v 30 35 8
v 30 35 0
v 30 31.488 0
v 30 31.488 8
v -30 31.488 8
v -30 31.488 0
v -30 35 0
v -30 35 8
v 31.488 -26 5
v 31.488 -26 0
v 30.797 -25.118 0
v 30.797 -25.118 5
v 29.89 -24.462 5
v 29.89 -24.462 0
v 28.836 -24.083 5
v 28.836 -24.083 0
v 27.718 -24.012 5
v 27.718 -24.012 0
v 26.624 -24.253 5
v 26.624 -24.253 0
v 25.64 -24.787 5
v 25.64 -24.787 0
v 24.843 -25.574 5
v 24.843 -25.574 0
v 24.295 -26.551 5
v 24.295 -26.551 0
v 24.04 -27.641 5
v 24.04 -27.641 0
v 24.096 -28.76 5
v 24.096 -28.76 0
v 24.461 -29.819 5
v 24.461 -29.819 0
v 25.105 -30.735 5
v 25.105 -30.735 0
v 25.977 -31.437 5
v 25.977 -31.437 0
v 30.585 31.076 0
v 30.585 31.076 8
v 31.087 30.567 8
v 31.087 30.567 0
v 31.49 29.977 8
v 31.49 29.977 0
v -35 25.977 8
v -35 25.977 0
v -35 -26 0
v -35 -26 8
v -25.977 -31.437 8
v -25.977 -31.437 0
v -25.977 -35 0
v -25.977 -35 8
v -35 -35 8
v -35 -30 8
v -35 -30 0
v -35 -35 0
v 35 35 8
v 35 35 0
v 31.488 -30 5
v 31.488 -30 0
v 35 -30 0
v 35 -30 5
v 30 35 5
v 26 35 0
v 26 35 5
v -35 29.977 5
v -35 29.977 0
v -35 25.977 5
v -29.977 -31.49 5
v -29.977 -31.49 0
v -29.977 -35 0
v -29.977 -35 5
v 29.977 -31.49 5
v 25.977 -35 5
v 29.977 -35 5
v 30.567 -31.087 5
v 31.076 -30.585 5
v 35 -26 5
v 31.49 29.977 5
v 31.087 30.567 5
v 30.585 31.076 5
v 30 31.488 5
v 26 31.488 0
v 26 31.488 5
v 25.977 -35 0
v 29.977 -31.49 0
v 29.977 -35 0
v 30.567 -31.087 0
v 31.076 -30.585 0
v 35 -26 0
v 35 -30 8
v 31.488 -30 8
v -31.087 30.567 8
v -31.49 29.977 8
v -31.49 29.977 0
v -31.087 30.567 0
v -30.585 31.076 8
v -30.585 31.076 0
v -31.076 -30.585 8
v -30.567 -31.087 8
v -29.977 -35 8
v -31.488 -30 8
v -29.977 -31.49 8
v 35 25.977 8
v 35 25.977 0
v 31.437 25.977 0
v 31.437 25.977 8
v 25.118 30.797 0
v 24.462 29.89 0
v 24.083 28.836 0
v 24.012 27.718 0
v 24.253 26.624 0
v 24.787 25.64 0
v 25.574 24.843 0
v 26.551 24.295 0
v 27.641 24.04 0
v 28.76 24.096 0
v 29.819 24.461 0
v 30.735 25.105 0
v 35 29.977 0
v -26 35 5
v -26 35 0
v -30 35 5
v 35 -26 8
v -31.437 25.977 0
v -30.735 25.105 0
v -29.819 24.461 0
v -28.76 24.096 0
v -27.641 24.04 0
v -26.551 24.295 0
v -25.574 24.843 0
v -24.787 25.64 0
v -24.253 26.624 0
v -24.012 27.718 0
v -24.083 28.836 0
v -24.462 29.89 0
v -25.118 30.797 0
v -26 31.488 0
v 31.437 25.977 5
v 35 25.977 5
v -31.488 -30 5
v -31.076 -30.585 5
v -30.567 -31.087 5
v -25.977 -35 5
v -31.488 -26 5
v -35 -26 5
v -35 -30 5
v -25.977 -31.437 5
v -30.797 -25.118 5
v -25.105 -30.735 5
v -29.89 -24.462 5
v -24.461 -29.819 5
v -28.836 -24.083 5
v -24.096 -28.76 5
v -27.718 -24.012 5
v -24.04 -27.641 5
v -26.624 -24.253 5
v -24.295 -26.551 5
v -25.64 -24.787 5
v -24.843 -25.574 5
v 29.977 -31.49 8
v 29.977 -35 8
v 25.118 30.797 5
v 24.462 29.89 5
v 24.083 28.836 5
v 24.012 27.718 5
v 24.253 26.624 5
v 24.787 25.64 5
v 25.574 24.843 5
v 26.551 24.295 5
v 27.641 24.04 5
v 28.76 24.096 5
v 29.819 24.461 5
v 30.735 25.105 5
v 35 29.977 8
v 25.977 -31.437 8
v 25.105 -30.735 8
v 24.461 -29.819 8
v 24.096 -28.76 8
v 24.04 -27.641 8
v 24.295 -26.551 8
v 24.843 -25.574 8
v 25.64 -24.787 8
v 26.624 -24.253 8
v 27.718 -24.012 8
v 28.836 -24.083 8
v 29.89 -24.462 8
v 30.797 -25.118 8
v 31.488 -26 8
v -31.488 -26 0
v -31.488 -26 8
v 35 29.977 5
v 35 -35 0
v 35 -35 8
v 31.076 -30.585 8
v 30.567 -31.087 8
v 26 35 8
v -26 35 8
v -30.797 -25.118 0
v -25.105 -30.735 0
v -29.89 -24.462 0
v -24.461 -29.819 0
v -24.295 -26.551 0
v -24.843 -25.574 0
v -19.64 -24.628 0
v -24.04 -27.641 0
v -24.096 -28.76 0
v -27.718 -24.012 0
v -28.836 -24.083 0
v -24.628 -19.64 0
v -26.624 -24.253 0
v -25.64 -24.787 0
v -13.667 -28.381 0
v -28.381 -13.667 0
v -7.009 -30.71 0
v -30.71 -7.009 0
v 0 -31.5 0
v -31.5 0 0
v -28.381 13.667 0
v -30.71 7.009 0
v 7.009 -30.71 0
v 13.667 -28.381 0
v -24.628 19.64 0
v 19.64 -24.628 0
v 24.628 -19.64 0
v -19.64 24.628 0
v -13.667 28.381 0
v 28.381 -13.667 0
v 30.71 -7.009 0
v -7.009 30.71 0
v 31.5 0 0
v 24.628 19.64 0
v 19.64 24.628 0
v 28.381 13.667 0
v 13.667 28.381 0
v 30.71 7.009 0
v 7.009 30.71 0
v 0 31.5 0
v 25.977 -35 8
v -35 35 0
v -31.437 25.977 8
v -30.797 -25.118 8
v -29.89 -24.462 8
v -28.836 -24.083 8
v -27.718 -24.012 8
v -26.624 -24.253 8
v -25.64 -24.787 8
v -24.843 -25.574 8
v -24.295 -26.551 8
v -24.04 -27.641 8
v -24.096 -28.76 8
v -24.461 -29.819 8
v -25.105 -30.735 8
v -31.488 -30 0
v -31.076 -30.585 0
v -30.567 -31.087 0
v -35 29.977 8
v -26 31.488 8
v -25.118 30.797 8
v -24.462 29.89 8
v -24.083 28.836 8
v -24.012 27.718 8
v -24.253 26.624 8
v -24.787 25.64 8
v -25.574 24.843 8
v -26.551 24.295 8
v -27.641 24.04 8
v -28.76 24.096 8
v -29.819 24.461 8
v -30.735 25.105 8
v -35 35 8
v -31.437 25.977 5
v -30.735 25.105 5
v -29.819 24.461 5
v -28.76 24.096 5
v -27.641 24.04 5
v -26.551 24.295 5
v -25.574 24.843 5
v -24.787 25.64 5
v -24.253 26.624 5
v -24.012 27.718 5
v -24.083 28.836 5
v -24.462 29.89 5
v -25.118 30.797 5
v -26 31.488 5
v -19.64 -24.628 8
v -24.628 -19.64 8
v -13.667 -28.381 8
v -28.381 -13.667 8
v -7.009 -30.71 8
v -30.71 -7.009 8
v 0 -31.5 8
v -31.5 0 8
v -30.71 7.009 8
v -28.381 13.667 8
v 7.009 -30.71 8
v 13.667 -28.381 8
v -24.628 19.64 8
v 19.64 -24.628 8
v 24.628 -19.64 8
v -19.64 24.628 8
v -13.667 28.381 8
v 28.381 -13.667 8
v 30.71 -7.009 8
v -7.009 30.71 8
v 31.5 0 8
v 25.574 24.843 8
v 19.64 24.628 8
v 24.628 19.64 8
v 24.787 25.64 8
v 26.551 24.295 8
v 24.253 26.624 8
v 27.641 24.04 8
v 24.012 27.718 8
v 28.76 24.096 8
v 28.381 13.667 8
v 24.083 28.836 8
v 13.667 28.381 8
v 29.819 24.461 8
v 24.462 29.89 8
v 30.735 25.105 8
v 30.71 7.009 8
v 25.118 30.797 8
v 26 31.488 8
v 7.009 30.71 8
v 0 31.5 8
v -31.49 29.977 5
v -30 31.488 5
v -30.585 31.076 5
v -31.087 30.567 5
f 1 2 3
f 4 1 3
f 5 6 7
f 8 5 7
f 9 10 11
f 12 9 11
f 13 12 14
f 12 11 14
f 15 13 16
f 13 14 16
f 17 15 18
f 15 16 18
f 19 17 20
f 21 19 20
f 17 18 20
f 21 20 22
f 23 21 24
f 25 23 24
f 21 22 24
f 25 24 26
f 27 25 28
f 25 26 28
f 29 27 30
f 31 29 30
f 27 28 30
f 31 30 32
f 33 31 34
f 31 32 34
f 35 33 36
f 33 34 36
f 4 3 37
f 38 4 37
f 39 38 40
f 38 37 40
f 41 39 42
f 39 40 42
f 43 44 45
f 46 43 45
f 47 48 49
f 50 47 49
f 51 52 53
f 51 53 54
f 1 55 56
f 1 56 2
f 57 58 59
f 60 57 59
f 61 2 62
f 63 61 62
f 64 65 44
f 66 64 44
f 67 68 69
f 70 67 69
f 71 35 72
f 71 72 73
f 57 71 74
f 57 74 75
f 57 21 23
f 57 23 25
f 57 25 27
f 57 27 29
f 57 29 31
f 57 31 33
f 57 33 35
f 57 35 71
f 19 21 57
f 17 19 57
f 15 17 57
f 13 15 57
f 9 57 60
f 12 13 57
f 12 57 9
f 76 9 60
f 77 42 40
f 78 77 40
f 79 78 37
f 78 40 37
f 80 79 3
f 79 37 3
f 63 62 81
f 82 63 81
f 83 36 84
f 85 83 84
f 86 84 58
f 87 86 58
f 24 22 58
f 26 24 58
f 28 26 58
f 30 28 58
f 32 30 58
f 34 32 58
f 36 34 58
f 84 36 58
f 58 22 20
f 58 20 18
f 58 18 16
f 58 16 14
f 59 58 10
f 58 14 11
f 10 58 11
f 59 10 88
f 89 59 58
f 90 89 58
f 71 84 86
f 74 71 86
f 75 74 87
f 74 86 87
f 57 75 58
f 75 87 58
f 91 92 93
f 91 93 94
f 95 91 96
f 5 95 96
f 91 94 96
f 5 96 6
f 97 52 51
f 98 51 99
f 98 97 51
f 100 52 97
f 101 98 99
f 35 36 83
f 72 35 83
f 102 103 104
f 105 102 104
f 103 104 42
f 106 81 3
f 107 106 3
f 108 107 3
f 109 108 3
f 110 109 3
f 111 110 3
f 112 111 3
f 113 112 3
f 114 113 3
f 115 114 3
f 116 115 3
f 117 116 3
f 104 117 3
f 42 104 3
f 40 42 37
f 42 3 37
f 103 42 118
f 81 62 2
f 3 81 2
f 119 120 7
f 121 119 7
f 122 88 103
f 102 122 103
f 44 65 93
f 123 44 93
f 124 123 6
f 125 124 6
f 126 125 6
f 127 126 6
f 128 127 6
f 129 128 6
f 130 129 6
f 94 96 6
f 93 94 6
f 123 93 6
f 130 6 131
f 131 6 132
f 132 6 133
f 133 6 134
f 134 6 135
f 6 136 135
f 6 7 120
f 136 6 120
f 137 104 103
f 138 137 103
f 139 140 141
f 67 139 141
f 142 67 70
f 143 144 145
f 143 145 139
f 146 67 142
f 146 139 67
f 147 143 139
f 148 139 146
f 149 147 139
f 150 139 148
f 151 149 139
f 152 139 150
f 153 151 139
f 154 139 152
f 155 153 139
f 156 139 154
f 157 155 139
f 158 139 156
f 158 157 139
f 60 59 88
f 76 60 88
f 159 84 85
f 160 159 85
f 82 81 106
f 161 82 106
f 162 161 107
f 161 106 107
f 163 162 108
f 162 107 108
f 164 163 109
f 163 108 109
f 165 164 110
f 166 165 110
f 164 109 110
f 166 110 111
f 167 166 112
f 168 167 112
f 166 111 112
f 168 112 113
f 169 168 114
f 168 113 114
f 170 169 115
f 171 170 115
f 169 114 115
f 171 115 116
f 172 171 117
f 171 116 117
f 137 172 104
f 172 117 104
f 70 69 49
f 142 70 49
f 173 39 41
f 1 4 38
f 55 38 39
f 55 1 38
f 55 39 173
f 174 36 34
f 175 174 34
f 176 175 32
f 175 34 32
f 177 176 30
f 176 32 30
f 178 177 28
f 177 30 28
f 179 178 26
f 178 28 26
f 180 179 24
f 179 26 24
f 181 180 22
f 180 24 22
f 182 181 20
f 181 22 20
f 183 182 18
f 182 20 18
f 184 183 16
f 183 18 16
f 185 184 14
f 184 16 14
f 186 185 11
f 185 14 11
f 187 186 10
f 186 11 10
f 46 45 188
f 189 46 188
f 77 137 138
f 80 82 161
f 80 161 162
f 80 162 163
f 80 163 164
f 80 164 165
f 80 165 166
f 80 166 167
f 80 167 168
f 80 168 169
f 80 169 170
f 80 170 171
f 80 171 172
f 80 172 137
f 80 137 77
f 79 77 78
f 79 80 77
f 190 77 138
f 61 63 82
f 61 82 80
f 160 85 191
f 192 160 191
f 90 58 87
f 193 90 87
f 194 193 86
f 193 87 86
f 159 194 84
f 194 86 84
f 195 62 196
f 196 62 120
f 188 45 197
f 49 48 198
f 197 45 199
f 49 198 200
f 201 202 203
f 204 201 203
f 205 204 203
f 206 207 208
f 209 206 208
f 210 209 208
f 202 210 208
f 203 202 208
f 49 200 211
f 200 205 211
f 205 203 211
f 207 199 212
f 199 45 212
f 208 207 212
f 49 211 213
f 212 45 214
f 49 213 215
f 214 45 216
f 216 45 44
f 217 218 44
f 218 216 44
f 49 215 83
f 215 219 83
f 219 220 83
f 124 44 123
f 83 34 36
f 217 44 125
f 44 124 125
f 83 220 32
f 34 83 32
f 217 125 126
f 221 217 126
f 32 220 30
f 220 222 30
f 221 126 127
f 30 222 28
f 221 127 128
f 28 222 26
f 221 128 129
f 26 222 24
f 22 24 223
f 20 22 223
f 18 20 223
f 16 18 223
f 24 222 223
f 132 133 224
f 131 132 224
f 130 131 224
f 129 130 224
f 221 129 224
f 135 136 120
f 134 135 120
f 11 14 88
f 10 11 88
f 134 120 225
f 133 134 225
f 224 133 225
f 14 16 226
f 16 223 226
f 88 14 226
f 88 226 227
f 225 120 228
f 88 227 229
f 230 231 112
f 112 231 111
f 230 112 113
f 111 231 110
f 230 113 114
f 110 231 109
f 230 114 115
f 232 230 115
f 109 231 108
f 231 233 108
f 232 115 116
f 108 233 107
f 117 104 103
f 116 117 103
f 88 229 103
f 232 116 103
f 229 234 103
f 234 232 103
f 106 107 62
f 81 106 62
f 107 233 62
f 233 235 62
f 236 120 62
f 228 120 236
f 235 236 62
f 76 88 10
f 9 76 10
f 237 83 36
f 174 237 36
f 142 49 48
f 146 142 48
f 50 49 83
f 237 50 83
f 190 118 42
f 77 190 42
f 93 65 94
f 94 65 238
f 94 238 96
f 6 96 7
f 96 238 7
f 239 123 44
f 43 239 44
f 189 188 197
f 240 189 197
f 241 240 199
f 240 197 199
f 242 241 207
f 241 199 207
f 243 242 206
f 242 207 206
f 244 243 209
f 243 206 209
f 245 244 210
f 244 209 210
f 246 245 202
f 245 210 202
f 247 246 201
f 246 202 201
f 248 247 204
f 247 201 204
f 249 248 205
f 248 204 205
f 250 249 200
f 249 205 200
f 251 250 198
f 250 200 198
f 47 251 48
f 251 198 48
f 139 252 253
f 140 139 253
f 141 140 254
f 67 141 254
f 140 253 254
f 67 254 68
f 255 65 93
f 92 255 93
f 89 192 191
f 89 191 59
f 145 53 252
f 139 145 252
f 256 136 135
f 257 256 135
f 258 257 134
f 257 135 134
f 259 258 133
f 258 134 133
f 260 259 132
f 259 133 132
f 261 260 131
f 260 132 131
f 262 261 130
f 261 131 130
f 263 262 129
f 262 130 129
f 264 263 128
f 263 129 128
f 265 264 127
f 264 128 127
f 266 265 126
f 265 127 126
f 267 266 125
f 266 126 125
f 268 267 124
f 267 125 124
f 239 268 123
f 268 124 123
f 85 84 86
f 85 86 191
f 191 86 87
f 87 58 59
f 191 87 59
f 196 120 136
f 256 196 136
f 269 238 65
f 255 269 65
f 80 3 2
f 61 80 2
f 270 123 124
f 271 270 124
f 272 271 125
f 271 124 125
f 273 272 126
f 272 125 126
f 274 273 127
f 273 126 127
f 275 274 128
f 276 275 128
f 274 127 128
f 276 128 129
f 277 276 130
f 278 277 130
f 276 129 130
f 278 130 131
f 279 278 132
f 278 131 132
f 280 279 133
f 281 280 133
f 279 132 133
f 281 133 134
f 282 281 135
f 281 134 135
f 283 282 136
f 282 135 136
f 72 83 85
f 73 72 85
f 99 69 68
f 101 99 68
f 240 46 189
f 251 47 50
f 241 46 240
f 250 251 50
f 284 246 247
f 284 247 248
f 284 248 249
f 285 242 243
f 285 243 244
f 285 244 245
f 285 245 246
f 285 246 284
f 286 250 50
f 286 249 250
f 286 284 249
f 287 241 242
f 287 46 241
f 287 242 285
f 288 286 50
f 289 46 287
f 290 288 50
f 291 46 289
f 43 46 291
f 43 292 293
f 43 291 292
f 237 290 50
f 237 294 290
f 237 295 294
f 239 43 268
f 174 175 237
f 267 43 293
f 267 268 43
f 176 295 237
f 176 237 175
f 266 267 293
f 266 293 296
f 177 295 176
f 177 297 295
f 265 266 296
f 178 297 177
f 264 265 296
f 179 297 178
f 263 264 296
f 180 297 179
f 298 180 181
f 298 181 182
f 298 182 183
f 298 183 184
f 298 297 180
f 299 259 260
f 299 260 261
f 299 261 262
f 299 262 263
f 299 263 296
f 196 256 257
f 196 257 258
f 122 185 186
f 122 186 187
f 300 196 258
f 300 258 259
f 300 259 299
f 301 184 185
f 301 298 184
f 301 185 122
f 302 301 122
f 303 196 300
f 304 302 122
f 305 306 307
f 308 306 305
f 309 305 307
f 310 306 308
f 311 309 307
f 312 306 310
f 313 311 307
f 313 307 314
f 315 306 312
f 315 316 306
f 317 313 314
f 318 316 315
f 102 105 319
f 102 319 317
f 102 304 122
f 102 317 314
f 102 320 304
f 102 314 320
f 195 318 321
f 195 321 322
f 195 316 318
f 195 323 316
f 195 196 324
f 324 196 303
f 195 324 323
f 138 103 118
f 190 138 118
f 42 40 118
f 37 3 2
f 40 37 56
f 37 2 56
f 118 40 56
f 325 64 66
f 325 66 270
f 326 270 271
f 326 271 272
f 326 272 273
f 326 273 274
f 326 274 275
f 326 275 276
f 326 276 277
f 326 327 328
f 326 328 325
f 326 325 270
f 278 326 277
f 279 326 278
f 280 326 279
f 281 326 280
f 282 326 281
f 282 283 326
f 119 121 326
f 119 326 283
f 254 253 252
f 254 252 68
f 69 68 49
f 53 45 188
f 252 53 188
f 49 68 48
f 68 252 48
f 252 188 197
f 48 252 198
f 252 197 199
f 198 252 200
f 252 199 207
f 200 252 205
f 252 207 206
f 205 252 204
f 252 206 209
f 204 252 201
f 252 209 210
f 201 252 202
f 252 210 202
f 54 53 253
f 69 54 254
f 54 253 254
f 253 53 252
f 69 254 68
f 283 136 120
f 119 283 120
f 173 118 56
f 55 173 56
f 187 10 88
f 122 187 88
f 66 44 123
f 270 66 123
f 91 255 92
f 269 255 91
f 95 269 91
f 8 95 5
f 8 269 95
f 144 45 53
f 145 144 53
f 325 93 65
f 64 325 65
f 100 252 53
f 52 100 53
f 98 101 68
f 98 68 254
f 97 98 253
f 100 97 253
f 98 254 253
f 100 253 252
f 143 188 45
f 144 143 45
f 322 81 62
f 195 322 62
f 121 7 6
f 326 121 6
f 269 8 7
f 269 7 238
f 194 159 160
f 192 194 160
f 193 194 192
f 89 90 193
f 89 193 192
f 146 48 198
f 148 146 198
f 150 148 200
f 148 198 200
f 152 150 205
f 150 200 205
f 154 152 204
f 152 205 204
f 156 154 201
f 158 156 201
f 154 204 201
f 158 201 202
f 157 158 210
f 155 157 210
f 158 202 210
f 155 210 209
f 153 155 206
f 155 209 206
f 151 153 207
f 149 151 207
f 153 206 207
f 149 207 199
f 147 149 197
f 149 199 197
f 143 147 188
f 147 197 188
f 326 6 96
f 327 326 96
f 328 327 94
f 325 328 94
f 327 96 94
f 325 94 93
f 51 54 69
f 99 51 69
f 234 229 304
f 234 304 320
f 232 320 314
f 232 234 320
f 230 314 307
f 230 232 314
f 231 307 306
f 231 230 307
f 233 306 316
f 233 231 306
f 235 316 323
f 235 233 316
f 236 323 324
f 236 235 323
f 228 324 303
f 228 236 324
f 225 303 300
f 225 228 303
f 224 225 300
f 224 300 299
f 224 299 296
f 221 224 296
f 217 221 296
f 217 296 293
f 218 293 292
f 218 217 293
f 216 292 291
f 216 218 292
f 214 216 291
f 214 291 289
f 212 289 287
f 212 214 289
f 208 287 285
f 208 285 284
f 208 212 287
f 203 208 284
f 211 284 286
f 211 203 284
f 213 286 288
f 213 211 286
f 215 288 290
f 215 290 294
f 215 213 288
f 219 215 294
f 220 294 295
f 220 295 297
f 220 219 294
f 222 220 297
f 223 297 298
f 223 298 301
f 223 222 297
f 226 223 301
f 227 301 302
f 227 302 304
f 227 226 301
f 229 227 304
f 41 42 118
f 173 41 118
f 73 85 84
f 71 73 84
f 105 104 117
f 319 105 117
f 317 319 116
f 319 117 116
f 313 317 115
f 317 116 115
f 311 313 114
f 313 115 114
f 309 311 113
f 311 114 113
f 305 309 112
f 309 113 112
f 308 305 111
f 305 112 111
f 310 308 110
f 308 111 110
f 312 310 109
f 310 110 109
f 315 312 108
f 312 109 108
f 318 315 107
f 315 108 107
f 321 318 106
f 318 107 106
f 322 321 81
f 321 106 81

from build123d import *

# Parameters (mm, degrees)
F0_R     = 31.5
F1_DEPTH = 8
F3_DEPTH = 8
F4_DEPTH = 5
F5_DEPTH = 8
F6_DEPTH = 5


# Not quite as in the source:
# - a feature names something its author has since deleted; it is built from what else it names


with BuildPart() as f1:
    # F0 (on Top) → F1 (new body)
    with BuildSketch(Plane.XY):
        with BuildLine():
            Line((-31.4370289465, 25.9772784561), (-35, 25.9772784561))
            Line((-35, 25.9772784561), (-35, -26))
            Line((-35, -26), (-31.4875550445, -26))
            ThreePointArc((-31.4875550445, -26), (-25.2140139956, -25.1527118045), (-25.9772784561, -31.4370289465))
            Line((-25.9772784561, -31.4370289465), (-25.9772784561, -35))
            Line((-25.9772784561, -35), (25.9772784561, -35))
            Line((25.9772784561, -35), (25.9772784561, -31.4370289465))
            ThreePointArc((25.9772784561, -31.4370289465), (25.2140139956, -25.1527118045), (31.4875550445, -26))
            Line((31.4875550445, -26), (35, -26))
            Line((35, -26), (35, -25.5))
            Line((35, -25.5), (35, 25.9772784561))
            Line((35, 25.9772784561), (31.4370289465, 25.9772784561))
            ThreePointArc((31.4370289465, 25.9772784561), (25.1527118045, 25.2140139956), (26, 31.4875550445))
            Line((26, 31.4875550445), (26, 35))
            Line((26, 35), (-25.5, 35))
            Line((-25.5, 35), (-26, 35))
            Line((-26, 35), (-26, 31.4875550445))
            ThreePointArc((-26, 31.4875550445), (-25.1527118045, 25.2140139956), (-31.4370289465, 25.9772784561))
        make_face()
        Circle(F0_R, mode=Mode.SUBTRACT)
    extrude(amount=F1_DEPTH)


with BuildPart() as f3:
    # F0 (on Top) → F3 (new body)
    with BuildSketch(Plane.XY):
        with BuildLine():
            Line((-31.9894003868, 35), (-35, 35))
            Line((-35, 35), (-35, 29.9772784561))
            Line((-35, 29.9772784561), (-31.4903535301, 29.9772784561))
            ThreePointArc((-31.4903535301, 29.9772784561), (-30.8471440629, 30.83303893), (-30, 31.4875550445))
            Line((-30, 31.4875550445), (-30, 35))
            Line((-30, 35), (-30.5, 35))
            Line((-30.5, 35), (-31.9894003868, 35))
        make_face()
    extrude(amount=F3_DEPTH)


with BuildPart() as f4:
    # F0 (on Top) → F4 (new body)
    with BuildSketch(Plane.XY):
        with BuildLine():
            Line((-31.4903535301, 29.9772784561), (-35, 29.9772784561))
            Line((-35, 29.9772784561), (-35, 25.9772784561))
            Line((-35, 25.9772784561), (-31.4370289465, 25.9772784561))
            ThreePointArc((-31.4370289465, 25.9772784561), (-25.1527118045, 25.2140139956), (-26, 31.4875550445))
            Line((-26, 31.4875550445), (-26, 35))
            Line((-26, 35), (-28, 35))
            Line((-28, 35), (-30, 35))
            Line((-30, 35), (-30, 31.4875550445))
            ThreePointArc((-30, 31.4875550445), (-30.8471440629, 30.83303893), (-31.4903535301, 29.9772784561))
        make_face()
    extrude(amount=F4_DEPTH)


with BuildPart() as f5:
    # F0 (on Top) → F5 (new body)
    with BuildSketch(Plane.XY):
        with BuildLine():
            Line((29.9772784561, -31.4903535301), (29.9772784561, -35))
            Line((29.9772784561, -35), (30.5105996132, -35))
            Line((30.5105996132, -35), (35, -35))
            Line((35, -35), (35, -31.9894003868))
            Line((35, -31.9894003868), (35, -30.5))
            Line((35, -30.5), (35, -30))
            Line((35, -30), (31.4875550445, -30))
            ThreePointArc((31.4875550445, -30), (30.83303893, -30.8471440629), (29.9772784561, -31.4903535301))
        make_face()
    extrude(amount=F5_DEPTH)


with BuildPart() as f5b:
    # F0 (on Top) → F5, piece 2 (new body)
    with BuildSketch(Plane.XY):
        with BuildLine():
            Line((-31.4875550445, -30), (-35, -30))
            Line((-35, -30), (-35, -35))
            Line((-35, -35), (-29.9772784561, -35))
            Line((-29.9772784561, -35), (-29.9772784561, -31.4903535301))
            ThreePointArc((-29.9772784561, -31.4903535301), (-30.83303893, -30.8471440629), (-31.4875550445, -30))
        make_face()
    extrude(amount=F5_DEPTH)


with BuildPart() as f5c:
    # F0 (on Top) → F5, piece 3 (new body)
    with BuildSketch(Plane.XY):
        with BuildLine():
            Line((31.9894003868, 35), (30, 35))
            Line((30, 35), (30, 31.4875550445))
            ThreePointArc((30, 31.4875550445), (30.8471440629, 30.83303893), (31.4903535301, 29.9772784561))
            Line((31.4903535301, 29.9772784561), (35, 29.9772784561))
            Line((35, 29.9772784561), (35, 35))
            Line((35, 35), (31.9894003868, 35))
        make_face()
    extrude(amount=F5_DEPTH)


with BuildPart() as f6:
    # F0 (on Top) → F6 (new body)
    with BuildSketch(Plane.XY):
        with BuildLine():
            Line((25.9772784561, -31.4370289465), (25.9772784561, -35))
            Line((25.9772784561, -35), (29.9772784561, -35))
            Line((29.9772784561, -35), (29.9772784561, -31.4903535301))
            ThreePointArc((29.9772784561, -31.4903535301), (30.83303893, -30.8471440629), (31.4875550445, -30))
            Line((31.4875550445, -30), (35, -30))
            Line((35, -30), (35, -28))
            Line((35, -28), (35, -26))
            Line((35, -26), (31.4875550445, -26))
            ThreePointArc((31.4875550445, -26), (25.2140139956, -25.1527118045), (25.9772784561, -31.4370289465))
        make_face()
    extrude(amount=F6_DEPTH)


with BuildPart() as f6b:
    # F0 (on Top) → F6, piece 2 (new body)
    with BuildSketch(Plane.XY):
        with BuildLine():
            Line((-31.4875550445, -26), (-35, -26))
            Line((-35, -26), (-35, -30))
            Line((-35, -30), (-31.4875550445, -30))
            ThreePointArc((-31.4875550445, -30), (-30.83303893, -30.8471440629), (-29.9772784561, -31.4903535301))
            Line((-29.9772784561, -31.4903535301), (-29.9772784561, -35))
            Line((-29.9772784561, -35), (-25.9772784561, -35))
            Line((-25.9772784561, -35), (-25.9772784561, -31.4370289465))
            ThreePointArc((-25.9772784561, -31.4370289465), (-25.2140139956, -25.1527118045), (-31.4875550445, -26))
        make_face()
    extrude(amount=F6_DEPTH)


with BuildPart() as f6c:
    # F0 (on Top) → F6, piece 3 (new body)
    with BuildSketch(Plane.XY):
        with BuildLine():
            Line((28, 35), (26, 35))
            Line((26, 35), (26, 31.4875550445))
            ThreePointArc((26, 31.4875550445), (25.1527118045, 25.2140139956), (31.4370289465, 25.9772784561))
            Line((31.4370289465, 25.9772784561), (35, 25.9772784561))
            Line((35, 25.9772784561), (35, 29.9772784561))
            Line((35, 29.9772784561), (31.4903535301, 29.9772784561))
            ThreePointArc((31.4903535301, 29.9772784561), (30.8471440629, 30.83303893), (30, 31.4875550445))
            Line((30, 31.4875550445), (30, 35))
            Line((30, 35), (28, 35))
        make_face()
    extrude(amount=F6_DEPTH)


solid = Compound([f1.part, f3.part, f4.part, f5.part, f5b.part, f5c.part, f6.part, f6b.part, f6c.part])
